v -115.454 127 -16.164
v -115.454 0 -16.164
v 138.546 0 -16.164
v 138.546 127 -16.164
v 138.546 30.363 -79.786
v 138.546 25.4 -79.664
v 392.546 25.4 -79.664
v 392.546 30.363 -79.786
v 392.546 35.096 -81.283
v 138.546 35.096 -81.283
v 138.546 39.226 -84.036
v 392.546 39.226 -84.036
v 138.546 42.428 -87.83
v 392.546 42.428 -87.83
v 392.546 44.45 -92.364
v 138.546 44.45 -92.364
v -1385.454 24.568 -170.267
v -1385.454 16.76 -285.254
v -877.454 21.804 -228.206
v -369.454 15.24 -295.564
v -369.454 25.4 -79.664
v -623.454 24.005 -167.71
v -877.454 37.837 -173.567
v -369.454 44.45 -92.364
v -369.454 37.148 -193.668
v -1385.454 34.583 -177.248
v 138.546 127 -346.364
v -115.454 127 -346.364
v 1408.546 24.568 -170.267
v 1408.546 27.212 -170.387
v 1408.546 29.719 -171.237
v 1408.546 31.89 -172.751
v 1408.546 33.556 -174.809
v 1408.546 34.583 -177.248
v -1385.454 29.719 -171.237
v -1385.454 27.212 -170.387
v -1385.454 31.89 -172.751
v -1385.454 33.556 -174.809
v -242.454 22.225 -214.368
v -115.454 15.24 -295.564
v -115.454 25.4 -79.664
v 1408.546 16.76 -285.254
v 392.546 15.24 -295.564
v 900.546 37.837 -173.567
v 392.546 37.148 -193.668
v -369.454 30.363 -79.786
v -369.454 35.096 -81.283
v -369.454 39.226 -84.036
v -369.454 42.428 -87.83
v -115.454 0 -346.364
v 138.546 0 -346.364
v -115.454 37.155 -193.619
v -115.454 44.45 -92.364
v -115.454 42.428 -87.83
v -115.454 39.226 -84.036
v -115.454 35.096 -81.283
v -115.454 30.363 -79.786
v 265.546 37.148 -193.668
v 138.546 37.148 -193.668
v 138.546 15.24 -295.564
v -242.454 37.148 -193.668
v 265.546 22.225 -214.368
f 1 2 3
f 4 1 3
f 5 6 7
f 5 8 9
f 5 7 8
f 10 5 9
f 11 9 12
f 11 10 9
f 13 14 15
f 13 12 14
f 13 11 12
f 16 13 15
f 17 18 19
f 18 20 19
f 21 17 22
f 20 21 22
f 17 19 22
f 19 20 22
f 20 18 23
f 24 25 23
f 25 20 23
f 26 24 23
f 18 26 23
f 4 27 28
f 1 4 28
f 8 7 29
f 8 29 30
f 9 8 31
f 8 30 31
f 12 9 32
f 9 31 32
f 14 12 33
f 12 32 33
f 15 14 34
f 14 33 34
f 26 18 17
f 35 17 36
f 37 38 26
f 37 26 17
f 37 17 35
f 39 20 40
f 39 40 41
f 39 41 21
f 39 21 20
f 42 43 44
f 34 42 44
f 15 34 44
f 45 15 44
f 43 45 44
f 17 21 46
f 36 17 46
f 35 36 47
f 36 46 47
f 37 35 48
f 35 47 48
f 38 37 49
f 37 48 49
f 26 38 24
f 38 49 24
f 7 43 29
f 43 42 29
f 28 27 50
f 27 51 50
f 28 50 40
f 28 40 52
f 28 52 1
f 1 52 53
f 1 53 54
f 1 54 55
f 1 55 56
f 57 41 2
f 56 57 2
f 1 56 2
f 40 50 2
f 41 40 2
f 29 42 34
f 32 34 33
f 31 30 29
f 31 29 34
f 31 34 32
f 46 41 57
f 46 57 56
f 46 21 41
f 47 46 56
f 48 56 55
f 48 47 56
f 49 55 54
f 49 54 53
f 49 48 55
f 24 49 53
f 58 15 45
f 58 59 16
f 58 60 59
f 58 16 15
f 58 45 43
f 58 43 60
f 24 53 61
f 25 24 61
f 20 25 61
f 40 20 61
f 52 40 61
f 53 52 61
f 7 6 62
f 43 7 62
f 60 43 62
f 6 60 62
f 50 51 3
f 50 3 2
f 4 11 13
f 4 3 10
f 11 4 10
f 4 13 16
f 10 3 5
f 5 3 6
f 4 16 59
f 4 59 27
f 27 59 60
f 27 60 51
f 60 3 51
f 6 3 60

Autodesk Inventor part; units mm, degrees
ref_plane "YZ Plane" through (0, 0, 0) normal (1, 0, 0) x (0, 1, 0)
ref_plane "XZ Plane" through (0, 0, 0) normal (0, 1, 0) x (-1, 0, 0)
ref_plane "XY Plane" through (0, 0, 0) normal (0, 0, 1) x (1, 0, 0)
sketch "Sketch1" plane through (0, 0, 0) normal (0, 1, 0) x (-1, 0, 0)
  line L0 (115.4545, -16.1636) -> (-138.5455, -16.1636)
  line L1 (-138.5455, -16.1636) -> (-138.5455, -346.3636)
  line L2 (-138.5455, -346.3636) -> (115.4545, -346.3636)
  line L3 (115.4545, -346.3636) -> (115.4545, -16.1636)
  point P0 (0, 0)
  dimension "d0" = 254
  dimension "d1" = 330.2
extrude "Extrusion1" add sketch "Sketch1" along normal blind 127
sketch "Sketch2" plane through (138.5455, 0, -16.1636) normal (1, 0, 0) x (0, 0, -1)
  arc A0 (76.2, 44.45) -> (63.5, 25.4) centre (81.0618, 27.4505) ccw
  line L0 (76.2, 44.45) -> (177.2082, 44.45) construction
  line L1 (177.2082, 44.45) -> (279.4, 15.24) construction
  spline S0 degree 2 poles (76.2, 44.45) (177.2082, 44.45) (279.4, 15.24) knots 1 1 1 2 2 2
  line L2 (63.5, 25.4) -> (224.9578, 24.13) construction
  line L3 (224.9578, 24.13) -> (279.4, 15.24) construction
  spline S1 degree 2 poles (63.5, 25.4) (224.9578, 24.13) (279.4, 15.24) knots 1 1 1 2 2 2
  line L4 (0, 0) -> (330.2, 0) projected
  line L5 (0, 127) -> (330.2, 127) projected
  line L6 (0, 0) -> (0, 127) projected
  line L7 (330.2, 0) -> (330.2, 127) projected
  point P0 (-16.1636, 0)
  dimension "d4" = 25.4
  dimension "d5" = 15.24
  dimension "d6" = 24.13
  dimension "d7" = 82.55
  dimension "d8" = 82.55
  dimension "d9" = 63.5
  dimension "d10" = 76.2
  dimension "d11" = 50.8
  dimension "d12" = 101.0082
  dimension "d13" = 102.1918
extrude "Extrusion2" add sketch "Sketch2" along normal blind 254 and the other way blind 508 contours S0 S1 A0
ref_plane "Work Plane1" through (1408.5455, 0, -16.1636) normal (1, 0, 0) x (0, 0, -1)
sketch "Sketch5" plane through (1408.5455, 0, -16.1636) normal (1, 0, 0) x (0, 0, -1)
  arc A0 (76.2, 44.45) -> (63.5, 25.4) centre (81.0618, 27.4505) ccw projected
  spline S0 degree 2 poles (154.1033, 24.5678) (240.1651, 22.1028) (269.0908, 16.7605) knots 1 1 1 2 2 2
  spline S1 degree 2 poles (269.0908, 16.7605) (214.934, 33.4644) (161.0849, 34.5831) knots 1 1 1 2 2 2
  arc A1 (161.0849, 34.5831) -> (154.1033, 24.5678) centre (163.4885, 25.4665) ccw
  point P0 (-16.1636, 0)
loft "Loft1" add profiles "Sketch5" section 1 edges at (392.5455, 22.225, -214.3675) (392.5455, 37.1475, -193.6678) (392.5455, 37.2582, -82.5139)
ref_plane "Work Plane3" through (-1385.4545, 0, -16.1636) normal (-1, 0, 0) x (0, 0, 1)
sketch "Sketch7" plane through (-1385.4545, 0, -16.1636) normal (-1, 0, 0) x (0, 0, 1)
  spline S0 degree 2 poles (-269.0908, 16.7605) (-240.1651, 22.1028) (-154.1033, 24.5678) knots 0 0 0 1 1 1 projected
  spline S1 degree 2 poles (-161.0849, 34.5831) (-214.934, 33.4644) (-269.0908, 16.7605) knots 0 0 0 1 1 1 projected
  arc A0 (-154.1033, 24.5678) -> (-161.0849, 34.5831) centre (-163.4885, 25.4665) ccw projected
  point P0 (16.1636, 0)
loft "Loft2" add profiles "Sketch7" section 2 edges at (-369.4545, 22.225, -214.3675) (-369.4545, 37.2582, -82.5139) (-369.4545, 37.1475, -193.6678)
properties part number "Glider Box"
